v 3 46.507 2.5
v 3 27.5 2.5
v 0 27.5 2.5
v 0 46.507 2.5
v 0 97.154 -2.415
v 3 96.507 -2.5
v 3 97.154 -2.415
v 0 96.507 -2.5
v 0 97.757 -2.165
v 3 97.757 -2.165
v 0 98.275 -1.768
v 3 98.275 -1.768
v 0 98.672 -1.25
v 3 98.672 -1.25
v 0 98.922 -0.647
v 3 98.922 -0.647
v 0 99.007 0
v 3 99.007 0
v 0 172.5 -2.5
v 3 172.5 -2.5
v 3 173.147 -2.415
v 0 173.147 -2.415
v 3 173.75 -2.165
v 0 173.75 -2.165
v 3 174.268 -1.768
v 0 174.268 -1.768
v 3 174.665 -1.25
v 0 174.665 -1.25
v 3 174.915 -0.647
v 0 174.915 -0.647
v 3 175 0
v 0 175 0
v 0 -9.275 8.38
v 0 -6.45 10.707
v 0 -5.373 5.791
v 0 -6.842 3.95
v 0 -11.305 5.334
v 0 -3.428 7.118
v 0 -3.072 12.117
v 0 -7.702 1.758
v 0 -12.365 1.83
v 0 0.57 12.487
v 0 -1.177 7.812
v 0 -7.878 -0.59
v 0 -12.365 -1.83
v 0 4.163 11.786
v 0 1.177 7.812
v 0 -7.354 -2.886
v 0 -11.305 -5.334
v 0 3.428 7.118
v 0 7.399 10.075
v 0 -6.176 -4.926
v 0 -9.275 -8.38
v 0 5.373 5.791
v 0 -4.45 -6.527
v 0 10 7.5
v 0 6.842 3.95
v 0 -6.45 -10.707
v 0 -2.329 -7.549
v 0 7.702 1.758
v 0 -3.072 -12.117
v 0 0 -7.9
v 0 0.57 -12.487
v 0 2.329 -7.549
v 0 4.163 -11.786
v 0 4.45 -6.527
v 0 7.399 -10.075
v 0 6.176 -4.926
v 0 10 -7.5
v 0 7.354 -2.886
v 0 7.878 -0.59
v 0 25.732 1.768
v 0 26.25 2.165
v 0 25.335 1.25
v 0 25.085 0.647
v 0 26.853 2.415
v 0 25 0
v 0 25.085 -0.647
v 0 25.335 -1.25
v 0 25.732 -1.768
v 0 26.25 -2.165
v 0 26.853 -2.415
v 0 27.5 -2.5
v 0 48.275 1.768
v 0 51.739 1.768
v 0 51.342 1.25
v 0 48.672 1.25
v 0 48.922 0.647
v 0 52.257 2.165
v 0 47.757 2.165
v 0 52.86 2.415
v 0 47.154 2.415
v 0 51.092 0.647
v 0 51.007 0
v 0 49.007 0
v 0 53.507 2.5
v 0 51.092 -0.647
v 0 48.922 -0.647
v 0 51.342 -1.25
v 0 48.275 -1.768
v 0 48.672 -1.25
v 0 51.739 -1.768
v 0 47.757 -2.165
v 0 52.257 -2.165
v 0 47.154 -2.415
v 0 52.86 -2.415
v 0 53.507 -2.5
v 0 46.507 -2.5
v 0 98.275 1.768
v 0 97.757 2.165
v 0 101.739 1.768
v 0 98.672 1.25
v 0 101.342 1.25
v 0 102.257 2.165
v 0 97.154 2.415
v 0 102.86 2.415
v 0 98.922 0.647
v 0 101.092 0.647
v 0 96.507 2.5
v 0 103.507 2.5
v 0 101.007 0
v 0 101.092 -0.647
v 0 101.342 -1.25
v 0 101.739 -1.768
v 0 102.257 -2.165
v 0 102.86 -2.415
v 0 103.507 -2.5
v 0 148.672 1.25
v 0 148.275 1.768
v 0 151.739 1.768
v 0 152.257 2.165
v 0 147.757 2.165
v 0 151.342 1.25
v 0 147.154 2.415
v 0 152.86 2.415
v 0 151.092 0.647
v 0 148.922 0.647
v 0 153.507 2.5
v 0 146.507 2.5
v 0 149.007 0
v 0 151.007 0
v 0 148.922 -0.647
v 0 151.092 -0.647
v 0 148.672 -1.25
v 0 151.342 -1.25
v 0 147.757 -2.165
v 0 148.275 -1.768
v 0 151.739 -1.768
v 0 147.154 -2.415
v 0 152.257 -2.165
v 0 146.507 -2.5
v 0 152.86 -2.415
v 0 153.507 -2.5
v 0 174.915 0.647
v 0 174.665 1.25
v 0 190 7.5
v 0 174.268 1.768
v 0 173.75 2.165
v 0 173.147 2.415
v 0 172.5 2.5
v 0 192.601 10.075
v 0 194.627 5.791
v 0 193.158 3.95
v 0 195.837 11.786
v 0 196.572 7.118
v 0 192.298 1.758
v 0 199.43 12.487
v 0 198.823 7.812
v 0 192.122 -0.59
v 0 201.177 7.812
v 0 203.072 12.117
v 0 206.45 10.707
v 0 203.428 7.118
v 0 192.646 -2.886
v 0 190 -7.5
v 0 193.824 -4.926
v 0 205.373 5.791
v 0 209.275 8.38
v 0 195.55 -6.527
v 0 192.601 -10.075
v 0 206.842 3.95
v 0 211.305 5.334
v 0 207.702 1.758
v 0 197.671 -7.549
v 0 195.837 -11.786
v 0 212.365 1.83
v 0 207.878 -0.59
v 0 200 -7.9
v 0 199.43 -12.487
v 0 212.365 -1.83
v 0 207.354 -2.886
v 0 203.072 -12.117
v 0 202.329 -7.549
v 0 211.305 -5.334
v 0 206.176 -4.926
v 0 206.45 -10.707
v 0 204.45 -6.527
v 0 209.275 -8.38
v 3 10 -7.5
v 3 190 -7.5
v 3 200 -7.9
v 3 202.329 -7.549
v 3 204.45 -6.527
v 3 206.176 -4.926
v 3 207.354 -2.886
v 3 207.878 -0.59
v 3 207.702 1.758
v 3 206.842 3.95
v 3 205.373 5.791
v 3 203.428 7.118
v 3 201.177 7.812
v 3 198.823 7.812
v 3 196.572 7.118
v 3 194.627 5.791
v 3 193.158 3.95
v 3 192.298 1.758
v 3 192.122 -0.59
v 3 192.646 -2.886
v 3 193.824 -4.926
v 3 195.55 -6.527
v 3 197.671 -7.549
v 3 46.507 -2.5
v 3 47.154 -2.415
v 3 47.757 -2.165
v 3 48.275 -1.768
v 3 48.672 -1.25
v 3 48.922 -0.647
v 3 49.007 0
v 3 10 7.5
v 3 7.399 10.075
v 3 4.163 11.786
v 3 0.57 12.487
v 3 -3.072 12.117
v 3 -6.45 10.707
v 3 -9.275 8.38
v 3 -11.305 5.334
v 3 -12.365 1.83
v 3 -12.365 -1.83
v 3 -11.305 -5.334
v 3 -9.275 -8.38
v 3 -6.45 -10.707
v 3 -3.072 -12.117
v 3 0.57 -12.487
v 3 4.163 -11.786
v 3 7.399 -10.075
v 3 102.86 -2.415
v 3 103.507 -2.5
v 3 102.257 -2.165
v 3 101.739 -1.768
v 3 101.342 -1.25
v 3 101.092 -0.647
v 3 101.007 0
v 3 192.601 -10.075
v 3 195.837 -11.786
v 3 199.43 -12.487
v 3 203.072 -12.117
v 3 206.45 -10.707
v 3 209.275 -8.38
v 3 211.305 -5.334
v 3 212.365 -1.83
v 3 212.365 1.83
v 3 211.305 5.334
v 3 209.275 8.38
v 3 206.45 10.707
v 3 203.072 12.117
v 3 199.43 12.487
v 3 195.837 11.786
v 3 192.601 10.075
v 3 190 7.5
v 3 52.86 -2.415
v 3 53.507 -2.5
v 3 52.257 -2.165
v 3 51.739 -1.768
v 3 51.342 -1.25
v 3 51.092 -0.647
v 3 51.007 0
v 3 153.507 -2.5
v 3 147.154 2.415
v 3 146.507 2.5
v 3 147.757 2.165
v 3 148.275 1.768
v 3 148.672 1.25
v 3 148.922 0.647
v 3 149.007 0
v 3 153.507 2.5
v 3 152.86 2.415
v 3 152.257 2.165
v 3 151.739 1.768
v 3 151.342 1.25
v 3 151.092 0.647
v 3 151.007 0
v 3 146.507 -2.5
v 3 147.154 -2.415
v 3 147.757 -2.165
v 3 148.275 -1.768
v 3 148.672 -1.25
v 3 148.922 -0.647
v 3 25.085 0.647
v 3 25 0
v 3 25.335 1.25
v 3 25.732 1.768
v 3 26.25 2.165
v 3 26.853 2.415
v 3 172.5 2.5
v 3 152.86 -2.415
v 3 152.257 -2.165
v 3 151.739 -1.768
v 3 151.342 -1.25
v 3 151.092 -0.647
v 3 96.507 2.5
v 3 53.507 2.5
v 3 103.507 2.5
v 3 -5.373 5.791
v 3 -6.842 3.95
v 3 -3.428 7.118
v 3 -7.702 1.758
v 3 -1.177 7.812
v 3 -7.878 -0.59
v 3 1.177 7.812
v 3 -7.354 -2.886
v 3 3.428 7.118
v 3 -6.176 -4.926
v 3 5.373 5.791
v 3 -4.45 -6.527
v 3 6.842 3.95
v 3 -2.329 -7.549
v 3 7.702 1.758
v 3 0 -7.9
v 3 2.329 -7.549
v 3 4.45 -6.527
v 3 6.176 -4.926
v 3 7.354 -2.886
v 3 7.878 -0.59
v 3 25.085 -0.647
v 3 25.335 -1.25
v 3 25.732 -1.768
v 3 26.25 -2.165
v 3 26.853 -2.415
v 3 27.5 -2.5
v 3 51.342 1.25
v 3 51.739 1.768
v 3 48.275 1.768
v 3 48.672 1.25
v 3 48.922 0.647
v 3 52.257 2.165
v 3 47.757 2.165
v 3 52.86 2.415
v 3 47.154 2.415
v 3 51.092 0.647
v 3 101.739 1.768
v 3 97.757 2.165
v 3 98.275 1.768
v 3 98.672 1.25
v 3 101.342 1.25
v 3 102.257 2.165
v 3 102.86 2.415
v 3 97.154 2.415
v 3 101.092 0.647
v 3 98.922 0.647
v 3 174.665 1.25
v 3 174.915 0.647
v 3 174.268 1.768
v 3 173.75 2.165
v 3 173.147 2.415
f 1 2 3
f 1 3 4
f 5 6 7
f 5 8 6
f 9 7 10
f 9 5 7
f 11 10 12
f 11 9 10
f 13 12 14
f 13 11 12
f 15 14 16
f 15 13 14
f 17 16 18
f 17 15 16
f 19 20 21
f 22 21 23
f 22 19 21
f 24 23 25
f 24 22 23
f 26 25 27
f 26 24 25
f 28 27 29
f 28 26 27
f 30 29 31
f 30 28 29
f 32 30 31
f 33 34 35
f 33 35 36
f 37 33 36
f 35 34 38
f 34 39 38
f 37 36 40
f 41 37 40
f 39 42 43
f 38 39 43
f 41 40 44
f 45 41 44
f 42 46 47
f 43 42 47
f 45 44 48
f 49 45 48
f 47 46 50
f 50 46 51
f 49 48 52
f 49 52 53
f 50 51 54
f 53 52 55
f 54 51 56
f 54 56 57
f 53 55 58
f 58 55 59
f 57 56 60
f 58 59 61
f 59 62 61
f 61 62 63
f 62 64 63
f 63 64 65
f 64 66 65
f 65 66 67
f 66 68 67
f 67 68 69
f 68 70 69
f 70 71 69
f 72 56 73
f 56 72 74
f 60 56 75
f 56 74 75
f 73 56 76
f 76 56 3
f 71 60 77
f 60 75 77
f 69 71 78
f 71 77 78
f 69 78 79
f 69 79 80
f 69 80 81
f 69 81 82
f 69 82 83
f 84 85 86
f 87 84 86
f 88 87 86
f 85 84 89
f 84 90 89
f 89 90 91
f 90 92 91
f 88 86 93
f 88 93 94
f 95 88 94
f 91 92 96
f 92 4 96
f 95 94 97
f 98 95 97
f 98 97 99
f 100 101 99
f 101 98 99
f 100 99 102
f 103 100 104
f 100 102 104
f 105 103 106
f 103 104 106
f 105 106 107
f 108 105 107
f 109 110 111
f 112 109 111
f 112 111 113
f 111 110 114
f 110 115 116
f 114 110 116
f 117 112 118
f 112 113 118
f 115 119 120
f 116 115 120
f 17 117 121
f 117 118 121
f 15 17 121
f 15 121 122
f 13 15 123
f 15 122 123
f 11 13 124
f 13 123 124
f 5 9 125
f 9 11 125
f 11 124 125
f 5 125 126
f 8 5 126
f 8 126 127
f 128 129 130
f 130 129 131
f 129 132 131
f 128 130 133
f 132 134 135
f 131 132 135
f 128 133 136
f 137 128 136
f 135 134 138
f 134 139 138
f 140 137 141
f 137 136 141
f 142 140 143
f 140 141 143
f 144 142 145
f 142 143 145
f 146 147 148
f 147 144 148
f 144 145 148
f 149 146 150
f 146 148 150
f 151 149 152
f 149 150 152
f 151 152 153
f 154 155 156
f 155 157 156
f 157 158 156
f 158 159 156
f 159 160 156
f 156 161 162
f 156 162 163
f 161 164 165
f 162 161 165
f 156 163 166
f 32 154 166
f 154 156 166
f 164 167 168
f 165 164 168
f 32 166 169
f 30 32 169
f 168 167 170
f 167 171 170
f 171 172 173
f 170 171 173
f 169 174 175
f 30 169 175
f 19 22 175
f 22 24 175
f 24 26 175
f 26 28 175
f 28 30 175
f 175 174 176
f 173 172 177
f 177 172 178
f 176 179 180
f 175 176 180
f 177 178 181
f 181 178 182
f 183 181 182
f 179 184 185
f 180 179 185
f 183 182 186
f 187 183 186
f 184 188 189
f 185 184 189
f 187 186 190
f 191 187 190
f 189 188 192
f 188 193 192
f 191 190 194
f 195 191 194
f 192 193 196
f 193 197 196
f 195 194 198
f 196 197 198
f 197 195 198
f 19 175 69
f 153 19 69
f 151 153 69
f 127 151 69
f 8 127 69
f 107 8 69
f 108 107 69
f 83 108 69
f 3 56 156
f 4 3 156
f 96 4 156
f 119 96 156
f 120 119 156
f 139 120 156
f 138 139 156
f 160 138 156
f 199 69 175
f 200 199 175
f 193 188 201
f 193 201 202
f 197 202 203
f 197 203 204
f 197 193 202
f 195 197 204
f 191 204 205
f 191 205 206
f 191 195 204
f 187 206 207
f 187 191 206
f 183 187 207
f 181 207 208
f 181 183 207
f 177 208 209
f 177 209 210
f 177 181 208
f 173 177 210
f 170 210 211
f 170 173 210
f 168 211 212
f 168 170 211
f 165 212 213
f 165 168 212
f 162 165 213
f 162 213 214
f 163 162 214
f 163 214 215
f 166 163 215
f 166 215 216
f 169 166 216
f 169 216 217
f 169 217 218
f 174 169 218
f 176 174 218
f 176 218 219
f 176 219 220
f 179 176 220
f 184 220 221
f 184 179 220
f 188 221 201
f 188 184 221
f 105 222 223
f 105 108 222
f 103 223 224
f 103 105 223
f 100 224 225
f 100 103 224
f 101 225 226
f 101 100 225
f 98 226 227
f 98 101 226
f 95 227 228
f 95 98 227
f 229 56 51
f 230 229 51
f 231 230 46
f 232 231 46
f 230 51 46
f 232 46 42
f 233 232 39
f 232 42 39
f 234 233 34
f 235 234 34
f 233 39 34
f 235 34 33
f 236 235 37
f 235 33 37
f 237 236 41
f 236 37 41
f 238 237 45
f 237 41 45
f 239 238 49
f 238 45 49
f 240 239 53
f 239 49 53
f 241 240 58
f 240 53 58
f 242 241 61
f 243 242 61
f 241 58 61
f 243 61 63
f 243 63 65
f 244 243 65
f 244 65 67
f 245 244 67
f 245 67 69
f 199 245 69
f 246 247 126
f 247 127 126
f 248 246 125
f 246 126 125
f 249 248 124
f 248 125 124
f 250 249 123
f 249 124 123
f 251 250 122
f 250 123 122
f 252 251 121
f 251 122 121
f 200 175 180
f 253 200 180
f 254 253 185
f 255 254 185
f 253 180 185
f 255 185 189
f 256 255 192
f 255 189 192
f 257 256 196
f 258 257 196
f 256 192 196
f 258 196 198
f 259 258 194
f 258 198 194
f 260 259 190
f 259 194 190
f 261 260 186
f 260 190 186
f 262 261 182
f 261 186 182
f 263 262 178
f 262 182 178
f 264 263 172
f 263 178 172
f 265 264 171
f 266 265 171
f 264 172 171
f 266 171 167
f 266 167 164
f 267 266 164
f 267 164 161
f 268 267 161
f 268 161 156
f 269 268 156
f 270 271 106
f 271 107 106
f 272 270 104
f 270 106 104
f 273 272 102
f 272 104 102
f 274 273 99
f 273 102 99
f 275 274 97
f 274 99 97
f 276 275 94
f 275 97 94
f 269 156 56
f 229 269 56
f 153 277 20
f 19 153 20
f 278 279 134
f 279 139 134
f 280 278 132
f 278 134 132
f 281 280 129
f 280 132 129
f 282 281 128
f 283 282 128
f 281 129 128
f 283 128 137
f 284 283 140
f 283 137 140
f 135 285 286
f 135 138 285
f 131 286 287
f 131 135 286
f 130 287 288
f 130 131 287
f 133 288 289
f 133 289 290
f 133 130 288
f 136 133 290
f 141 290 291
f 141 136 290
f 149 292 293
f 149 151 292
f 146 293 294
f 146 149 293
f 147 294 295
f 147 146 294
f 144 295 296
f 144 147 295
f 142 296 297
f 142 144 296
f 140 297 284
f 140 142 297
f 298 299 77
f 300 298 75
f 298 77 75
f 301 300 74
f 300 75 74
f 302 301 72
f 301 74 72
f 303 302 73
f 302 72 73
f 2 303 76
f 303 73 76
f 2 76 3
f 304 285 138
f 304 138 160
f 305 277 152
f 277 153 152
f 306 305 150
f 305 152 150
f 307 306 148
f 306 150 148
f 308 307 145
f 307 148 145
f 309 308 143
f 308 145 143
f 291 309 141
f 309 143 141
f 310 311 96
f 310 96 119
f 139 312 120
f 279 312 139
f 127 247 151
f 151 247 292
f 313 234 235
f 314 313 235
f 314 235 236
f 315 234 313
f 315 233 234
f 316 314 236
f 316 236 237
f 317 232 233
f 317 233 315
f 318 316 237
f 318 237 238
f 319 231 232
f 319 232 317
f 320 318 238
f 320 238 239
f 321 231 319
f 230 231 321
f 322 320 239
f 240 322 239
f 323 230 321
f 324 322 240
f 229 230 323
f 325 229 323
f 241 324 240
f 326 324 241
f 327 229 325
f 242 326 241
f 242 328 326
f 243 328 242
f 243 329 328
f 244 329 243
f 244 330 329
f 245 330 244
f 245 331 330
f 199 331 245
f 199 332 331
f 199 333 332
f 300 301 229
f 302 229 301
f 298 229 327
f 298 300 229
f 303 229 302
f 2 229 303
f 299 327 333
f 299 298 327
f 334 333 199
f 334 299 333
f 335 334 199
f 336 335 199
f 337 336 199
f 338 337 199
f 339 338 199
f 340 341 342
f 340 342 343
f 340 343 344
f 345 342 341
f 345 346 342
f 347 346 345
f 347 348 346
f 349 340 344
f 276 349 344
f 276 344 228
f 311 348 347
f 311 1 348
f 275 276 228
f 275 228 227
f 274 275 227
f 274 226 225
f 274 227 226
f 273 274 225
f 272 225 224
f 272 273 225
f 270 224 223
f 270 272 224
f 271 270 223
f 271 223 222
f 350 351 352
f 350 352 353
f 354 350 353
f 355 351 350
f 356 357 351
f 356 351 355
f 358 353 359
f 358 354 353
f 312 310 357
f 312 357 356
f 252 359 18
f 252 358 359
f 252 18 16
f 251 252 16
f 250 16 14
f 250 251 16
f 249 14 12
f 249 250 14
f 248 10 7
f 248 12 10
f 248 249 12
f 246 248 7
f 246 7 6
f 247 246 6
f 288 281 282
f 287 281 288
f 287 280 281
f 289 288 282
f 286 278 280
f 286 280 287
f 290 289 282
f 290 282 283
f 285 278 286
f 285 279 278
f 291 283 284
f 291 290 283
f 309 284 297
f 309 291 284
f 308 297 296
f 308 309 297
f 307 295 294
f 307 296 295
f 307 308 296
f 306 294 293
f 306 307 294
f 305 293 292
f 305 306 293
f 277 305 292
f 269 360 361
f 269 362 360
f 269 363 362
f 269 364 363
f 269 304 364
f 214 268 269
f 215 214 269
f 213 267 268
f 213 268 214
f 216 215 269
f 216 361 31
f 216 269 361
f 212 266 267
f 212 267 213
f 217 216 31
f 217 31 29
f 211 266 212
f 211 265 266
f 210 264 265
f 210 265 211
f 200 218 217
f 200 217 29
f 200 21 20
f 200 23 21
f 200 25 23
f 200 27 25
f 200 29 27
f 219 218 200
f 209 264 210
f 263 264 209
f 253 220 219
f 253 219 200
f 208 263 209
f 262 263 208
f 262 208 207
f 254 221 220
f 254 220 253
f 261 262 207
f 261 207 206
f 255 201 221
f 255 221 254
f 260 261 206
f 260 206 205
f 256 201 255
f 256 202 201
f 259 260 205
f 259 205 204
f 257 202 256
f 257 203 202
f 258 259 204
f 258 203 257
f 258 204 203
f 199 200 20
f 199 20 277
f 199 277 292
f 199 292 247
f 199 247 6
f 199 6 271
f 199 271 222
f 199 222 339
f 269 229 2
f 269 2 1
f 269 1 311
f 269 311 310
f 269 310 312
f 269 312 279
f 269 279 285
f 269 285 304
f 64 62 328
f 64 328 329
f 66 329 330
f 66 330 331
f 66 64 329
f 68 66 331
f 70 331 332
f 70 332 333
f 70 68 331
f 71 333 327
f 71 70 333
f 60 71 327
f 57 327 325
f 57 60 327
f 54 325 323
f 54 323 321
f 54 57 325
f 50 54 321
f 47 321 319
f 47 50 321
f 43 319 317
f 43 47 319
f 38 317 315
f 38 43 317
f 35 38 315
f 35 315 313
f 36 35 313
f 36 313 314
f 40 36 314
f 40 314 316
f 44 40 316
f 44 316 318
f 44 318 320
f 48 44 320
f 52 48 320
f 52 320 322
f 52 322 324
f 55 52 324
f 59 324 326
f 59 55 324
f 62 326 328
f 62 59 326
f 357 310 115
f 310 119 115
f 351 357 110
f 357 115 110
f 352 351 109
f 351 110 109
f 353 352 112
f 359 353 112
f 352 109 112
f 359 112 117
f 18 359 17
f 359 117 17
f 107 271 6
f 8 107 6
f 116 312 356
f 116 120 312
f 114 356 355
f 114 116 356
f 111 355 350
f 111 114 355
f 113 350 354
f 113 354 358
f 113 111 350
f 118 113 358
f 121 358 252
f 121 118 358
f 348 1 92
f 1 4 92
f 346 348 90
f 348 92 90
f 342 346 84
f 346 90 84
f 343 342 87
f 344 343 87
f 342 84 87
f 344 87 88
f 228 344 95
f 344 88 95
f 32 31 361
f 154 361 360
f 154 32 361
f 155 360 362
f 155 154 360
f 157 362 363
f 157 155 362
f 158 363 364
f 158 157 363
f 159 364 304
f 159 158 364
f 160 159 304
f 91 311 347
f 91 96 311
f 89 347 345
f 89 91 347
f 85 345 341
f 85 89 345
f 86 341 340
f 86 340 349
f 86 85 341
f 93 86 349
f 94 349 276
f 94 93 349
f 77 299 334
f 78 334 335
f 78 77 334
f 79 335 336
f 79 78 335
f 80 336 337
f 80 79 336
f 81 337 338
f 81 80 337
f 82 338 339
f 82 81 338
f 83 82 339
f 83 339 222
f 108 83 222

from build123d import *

# Parameters (mm, degrees)
SKETCH1_R           = 7.9
BOSS_EXTRUDE1_DEPTH = 3
SKETCH3_W           = 5
SKETCH3_H           = 150
CUT_EXTRUDE2_DEPTH  = 213.888468452
FILLET2_R           = 2.5
SKETCH4_W           = 5
SKETCH4_H           = 2
BOSS_EXTRUDE2_DEPTH = 3
FILLET3_R           = 2.5


with BuildPart() as part:
    # Sketch1 → Boss-Extrude1 (new body)
    with BuildSketch(Plane(origin=(0, 0, 0), x_dir=(0, 0, -1), z_dir=(1, 0, 0))):
        with BuildLine():
            Line((7.5, 10), (7.5, 190))
            ThreePointArc((7.5, 190), (0, 212.5), (-7.5, 190))
            Line((-7.5, 190), (-7.5, 10))
            ThreePointArc((-7.5, 10), (0, -12.5), (7.5, 10))
        make_face()
        Circle(SKETCH1_R, mode=Mode.SUBTRACT)
        with Locations((0, 200)):
            Circle(SKETCH1_R, mode=Mode.SUBTRACT)
    extrude(amount=BOSS_EXTRUDE1_DEPTH)

    # Sketch3 → Cut-Extrude2 (cut, through all)
    with BuildSketch(Plane(origin=(3, 0, 0), x_dir=(0, 0, -1), z_dir=(1, 0, 0))):
        with Locations((0, 100)):
            Rectangle(SKETCH3_W, SKETCH3_H)
    extrude(amount=-CUT_EXTRUDE2_DEPTH, mode=Mode.SUBTRACT)

    # Fillet2
    fillet2_edges = [part.edges().sort_by_distance(p)[0] for p in [
        (1.5, 175, 2.5),
        (1.5, 175, -2.5),
        (1.5, 25, 2.5),
        (1.5, 25, -2.5),
    ]]
    fillet(fillet2_edges, radius=FILLET2_R - 0.0001)  # a hair under: the kernel refuses the full size

    # Sketch4 → Boss-Extrude2 (add)
    with BuildSketch(Plane(origin=(3, 0, 0), x_dir=(0, 0, -1), z_dir=(1, 0, 0))):
        with Locations((0, 100.007044109)):
            Rectangle(SKETCH4_W, SKETCH4_H)
        with Locations((0, 50.007044109)):
            Rectangle(SKETCH4_W, SKETCH4_H)
        with Locations((0, 150.007044109)):
            Rectangle(SKETCH4_W, SKETCH4_H)
    extrude(amount=-BOSS_EXTRUDE2_DEPTH)

    # Fillet3
    fillet3_edges = [part.edges().sort_by_distance(p)[0] for p in [
        (1.5, 101.007044109, -2.5),
        (1.5, 101.007044109, 2.5),
        (1.5, 51.007044109, 2.5),
        (1.5, 51.007044109, -2.5),
        (1.5, 49.007044109, 2.5),
        (1.5, 49.007044109, -2.5),
        (1.5, 99.007044109, -2.5),
        (1.5, 99.007044109, 2.5),
        (1.5, 149.007044109, 2.5),
        (1.5, 149.007044109, -2.5),
        (1.5, 151.007044109, 2.5),
        (1.5, 151.007044109, -2.5),
    ]]
    fillet(fillet3_edges, radius=FILLET3_R - 0.0001)  # a hair under: the kernel refuses the full size


solid = part.part
